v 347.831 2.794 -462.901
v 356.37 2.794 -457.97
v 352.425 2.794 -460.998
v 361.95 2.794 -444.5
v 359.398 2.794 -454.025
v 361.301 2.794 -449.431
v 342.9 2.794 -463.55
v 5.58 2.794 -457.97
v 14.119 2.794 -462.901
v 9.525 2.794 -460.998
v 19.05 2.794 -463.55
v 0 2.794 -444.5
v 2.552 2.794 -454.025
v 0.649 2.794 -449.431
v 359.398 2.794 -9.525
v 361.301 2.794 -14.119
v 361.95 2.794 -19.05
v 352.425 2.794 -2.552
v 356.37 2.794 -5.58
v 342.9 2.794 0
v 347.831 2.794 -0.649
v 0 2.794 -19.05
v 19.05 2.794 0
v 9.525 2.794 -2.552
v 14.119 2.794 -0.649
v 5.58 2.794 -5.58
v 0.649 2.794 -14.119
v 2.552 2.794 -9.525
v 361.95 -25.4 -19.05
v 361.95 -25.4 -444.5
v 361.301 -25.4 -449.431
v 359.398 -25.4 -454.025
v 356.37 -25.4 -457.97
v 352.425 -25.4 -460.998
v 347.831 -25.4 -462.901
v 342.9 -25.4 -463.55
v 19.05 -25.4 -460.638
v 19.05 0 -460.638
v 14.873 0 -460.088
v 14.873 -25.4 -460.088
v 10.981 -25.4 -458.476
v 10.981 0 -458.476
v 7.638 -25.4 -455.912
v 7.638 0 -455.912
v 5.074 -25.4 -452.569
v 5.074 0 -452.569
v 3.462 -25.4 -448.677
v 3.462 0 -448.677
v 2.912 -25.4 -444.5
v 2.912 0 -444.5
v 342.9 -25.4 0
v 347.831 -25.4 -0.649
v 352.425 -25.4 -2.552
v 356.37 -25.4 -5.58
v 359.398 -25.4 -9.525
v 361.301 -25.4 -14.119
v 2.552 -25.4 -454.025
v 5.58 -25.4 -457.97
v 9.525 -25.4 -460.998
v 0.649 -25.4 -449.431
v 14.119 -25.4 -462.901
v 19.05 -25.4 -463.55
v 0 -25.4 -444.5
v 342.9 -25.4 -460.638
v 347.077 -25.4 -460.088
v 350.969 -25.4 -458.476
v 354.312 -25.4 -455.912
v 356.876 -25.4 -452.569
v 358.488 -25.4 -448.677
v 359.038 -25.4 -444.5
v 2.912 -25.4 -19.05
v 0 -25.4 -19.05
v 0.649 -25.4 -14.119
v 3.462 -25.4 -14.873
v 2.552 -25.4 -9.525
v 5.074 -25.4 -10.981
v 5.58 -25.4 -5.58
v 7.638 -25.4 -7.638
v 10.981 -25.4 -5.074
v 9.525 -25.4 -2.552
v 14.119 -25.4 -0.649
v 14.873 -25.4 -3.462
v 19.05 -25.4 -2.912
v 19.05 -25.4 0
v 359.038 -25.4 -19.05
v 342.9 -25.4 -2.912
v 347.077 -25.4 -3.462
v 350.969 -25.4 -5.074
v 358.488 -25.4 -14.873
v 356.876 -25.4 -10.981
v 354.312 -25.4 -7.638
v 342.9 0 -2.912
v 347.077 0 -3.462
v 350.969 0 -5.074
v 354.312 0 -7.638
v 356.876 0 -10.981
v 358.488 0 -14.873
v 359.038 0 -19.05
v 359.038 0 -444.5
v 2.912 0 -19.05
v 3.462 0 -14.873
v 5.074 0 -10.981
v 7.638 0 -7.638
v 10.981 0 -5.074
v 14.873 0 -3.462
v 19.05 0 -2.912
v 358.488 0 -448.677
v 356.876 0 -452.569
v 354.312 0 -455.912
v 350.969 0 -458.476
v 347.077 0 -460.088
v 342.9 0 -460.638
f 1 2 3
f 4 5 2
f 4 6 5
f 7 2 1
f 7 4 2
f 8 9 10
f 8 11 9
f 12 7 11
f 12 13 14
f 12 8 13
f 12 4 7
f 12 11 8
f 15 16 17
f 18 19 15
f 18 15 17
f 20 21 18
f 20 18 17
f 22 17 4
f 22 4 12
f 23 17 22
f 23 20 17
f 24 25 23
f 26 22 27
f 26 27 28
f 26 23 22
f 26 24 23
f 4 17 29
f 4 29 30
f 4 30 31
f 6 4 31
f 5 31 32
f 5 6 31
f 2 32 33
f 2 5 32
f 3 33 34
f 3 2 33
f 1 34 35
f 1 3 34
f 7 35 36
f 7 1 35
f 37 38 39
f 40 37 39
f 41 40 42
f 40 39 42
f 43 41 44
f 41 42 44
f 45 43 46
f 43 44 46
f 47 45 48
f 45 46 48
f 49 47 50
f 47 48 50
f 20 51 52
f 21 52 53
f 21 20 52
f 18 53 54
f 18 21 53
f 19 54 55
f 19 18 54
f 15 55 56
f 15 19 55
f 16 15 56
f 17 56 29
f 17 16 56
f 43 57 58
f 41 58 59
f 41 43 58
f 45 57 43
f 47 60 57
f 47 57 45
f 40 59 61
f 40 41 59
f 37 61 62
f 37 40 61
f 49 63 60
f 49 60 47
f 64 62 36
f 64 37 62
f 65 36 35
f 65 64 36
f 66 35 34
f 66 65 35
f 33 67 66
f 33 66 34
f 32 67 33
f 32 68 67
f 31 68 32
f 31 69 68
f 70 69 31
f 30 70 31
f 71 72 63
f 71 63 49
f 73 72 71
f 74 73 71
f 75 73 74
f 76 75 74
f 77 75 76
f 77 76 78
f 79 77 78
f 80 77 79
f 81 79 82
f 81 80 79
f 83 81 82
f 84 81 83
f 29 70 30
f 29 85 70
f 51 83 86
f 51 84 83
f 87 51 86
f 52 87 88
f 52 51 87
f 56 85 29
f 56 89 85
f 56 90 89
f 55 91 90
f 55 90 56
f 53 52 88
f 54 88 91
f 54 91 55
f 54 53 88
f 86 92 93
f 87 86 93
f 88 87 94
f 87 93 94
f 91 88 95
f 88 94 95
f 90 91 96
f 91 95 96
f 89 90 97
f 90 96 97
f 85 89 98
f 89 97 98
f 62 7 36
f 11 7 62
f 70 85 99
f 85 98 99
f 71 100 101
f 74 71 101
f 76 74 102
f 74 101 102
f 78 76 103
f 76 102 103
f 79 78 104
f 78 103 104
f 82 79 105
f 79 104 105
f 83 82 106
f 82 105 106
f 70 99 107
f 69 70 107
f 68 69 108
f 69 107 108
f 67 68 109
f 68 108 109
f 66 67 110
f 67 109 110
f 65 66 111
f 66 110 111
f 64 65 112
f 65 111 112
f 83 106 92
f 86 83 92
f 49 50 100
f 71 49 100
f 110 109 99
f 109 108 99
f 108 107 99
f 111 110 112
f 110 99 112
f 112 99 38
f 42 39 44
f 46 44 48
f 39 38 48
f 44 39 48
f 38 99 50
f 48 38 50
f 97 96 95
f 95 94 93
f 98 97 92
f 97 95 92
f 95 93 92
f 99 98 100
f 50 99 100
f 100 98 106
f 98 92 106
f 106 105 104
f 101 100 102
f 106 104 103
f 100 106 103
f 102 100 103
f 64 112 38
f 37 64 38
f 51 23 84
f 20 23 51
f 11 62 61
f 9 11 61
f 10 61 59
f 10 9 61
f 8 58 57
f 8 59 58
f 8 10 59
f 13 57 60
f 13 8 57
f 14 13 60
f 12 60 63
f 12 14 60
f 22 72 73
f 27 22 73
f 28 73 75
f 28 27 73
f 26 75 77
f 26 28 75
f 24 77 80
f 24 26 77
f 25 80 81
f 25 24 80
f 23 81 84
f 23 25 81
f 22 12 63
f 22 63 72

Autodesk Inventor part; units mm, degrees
ref_plane "YZ Plane" through (0, 0, 0) normal (1, 0, 0) x (0, 1, 0)
ref_plane "XZ Plane" through (0, 0, 0) normal (0, 1, 0) x (-1, 0, 0)
ref_plane "XY Plane" through (0, 0, 0) normal (0, 0, 1) x (1, 0, 0)
sketch "Sketch1" plane through (0, 0, 0) normal (0, 1, 0) x (-1, 0, 0)
  line L0 (0, 0) -> (-361.95, 0)
  line L1 (-361.95, 0) -> (-361.95, -463.55)
  line L2 (-361.95, -463.55) -> (0, -463.55)
  line L3 (0, -463.55) -> (0, 0)
  dimension "d0" = 361.95
  dimension "d1" = 463.55
extrude "Extrusion1" add sketch "Sketch1" along normal blind 2.794
fillet "Fillet1" radius 19.05 4 edges at (361.95, 1.397, 0) (361.95, 1.397, -463.55) (0, 1.397, -463.55) (0, 1.397, 0)
sketch "Sketch4" plane through (0, 0, 0) normal (0, -1, 0) x (1, 0, 0)
  point P0 (0, 0)
sketch "Sketch5" plane through (0, 0, 0) normal (0, -1, 0) x (1, 0, 0)
  arc A0 (19.05, 0) -> (0, -19.05) centre (19.05, -19.05) ccw projected
  line L0 (19.05, 0) -> (342.9, 0) projected
  line L1 (0, -444.5) -> (0, -19.05) projected
  line L2 (361.95, -19.05) -> (361.95, -444.5) projected
  arc A1 (361.95, -19.05) -> (342.9, 0) centre (342.9, -19.05) ccw projected
  arc A2 (0, -444.5) -> (19.05, -463.55) centre (19.05, -444.5) ccw projected
  line L3 (342.9, -463.55) -> (19.05, -463.55) projected
  arc A3 (342.9, -463.55) -> (361.95, -444.5) centre (342.9, -444.5) ccw projected
  arc A4 (2.9117, -444.5) -> (19.05, -460.6383) centre (19.05, -444.5) ccw
  line L4 (2.9117, -444.5) -> (2.9117, -19.05)
  arc A5 (19.05, -2.9117) -> (2.9117, -19.05) centre (19.05, -19.05) ccw
  line L5 (19.05, -2.9117) -> (342.9, -2.9117)
  arc A6 (359.0383, -19.05) -> (342.9, -2.9117) centre (342.9, -19.05) ccw
  line L6 (359.0383, -19.05) -> (359.0383, -444.5)
  arc A7 (342.9, -460.6383) -> (359.0383, -444.5) centre (342.9, -444.5) ccw
  line L7 (342.9, -460.6383) -> (19.05, -460.6383)
  point P0 (0, 0)
extrude "Extrusion2" add sketch "Sketch5" along normal blind 25.4
properties part number "Cart_LOW_SHELF"
